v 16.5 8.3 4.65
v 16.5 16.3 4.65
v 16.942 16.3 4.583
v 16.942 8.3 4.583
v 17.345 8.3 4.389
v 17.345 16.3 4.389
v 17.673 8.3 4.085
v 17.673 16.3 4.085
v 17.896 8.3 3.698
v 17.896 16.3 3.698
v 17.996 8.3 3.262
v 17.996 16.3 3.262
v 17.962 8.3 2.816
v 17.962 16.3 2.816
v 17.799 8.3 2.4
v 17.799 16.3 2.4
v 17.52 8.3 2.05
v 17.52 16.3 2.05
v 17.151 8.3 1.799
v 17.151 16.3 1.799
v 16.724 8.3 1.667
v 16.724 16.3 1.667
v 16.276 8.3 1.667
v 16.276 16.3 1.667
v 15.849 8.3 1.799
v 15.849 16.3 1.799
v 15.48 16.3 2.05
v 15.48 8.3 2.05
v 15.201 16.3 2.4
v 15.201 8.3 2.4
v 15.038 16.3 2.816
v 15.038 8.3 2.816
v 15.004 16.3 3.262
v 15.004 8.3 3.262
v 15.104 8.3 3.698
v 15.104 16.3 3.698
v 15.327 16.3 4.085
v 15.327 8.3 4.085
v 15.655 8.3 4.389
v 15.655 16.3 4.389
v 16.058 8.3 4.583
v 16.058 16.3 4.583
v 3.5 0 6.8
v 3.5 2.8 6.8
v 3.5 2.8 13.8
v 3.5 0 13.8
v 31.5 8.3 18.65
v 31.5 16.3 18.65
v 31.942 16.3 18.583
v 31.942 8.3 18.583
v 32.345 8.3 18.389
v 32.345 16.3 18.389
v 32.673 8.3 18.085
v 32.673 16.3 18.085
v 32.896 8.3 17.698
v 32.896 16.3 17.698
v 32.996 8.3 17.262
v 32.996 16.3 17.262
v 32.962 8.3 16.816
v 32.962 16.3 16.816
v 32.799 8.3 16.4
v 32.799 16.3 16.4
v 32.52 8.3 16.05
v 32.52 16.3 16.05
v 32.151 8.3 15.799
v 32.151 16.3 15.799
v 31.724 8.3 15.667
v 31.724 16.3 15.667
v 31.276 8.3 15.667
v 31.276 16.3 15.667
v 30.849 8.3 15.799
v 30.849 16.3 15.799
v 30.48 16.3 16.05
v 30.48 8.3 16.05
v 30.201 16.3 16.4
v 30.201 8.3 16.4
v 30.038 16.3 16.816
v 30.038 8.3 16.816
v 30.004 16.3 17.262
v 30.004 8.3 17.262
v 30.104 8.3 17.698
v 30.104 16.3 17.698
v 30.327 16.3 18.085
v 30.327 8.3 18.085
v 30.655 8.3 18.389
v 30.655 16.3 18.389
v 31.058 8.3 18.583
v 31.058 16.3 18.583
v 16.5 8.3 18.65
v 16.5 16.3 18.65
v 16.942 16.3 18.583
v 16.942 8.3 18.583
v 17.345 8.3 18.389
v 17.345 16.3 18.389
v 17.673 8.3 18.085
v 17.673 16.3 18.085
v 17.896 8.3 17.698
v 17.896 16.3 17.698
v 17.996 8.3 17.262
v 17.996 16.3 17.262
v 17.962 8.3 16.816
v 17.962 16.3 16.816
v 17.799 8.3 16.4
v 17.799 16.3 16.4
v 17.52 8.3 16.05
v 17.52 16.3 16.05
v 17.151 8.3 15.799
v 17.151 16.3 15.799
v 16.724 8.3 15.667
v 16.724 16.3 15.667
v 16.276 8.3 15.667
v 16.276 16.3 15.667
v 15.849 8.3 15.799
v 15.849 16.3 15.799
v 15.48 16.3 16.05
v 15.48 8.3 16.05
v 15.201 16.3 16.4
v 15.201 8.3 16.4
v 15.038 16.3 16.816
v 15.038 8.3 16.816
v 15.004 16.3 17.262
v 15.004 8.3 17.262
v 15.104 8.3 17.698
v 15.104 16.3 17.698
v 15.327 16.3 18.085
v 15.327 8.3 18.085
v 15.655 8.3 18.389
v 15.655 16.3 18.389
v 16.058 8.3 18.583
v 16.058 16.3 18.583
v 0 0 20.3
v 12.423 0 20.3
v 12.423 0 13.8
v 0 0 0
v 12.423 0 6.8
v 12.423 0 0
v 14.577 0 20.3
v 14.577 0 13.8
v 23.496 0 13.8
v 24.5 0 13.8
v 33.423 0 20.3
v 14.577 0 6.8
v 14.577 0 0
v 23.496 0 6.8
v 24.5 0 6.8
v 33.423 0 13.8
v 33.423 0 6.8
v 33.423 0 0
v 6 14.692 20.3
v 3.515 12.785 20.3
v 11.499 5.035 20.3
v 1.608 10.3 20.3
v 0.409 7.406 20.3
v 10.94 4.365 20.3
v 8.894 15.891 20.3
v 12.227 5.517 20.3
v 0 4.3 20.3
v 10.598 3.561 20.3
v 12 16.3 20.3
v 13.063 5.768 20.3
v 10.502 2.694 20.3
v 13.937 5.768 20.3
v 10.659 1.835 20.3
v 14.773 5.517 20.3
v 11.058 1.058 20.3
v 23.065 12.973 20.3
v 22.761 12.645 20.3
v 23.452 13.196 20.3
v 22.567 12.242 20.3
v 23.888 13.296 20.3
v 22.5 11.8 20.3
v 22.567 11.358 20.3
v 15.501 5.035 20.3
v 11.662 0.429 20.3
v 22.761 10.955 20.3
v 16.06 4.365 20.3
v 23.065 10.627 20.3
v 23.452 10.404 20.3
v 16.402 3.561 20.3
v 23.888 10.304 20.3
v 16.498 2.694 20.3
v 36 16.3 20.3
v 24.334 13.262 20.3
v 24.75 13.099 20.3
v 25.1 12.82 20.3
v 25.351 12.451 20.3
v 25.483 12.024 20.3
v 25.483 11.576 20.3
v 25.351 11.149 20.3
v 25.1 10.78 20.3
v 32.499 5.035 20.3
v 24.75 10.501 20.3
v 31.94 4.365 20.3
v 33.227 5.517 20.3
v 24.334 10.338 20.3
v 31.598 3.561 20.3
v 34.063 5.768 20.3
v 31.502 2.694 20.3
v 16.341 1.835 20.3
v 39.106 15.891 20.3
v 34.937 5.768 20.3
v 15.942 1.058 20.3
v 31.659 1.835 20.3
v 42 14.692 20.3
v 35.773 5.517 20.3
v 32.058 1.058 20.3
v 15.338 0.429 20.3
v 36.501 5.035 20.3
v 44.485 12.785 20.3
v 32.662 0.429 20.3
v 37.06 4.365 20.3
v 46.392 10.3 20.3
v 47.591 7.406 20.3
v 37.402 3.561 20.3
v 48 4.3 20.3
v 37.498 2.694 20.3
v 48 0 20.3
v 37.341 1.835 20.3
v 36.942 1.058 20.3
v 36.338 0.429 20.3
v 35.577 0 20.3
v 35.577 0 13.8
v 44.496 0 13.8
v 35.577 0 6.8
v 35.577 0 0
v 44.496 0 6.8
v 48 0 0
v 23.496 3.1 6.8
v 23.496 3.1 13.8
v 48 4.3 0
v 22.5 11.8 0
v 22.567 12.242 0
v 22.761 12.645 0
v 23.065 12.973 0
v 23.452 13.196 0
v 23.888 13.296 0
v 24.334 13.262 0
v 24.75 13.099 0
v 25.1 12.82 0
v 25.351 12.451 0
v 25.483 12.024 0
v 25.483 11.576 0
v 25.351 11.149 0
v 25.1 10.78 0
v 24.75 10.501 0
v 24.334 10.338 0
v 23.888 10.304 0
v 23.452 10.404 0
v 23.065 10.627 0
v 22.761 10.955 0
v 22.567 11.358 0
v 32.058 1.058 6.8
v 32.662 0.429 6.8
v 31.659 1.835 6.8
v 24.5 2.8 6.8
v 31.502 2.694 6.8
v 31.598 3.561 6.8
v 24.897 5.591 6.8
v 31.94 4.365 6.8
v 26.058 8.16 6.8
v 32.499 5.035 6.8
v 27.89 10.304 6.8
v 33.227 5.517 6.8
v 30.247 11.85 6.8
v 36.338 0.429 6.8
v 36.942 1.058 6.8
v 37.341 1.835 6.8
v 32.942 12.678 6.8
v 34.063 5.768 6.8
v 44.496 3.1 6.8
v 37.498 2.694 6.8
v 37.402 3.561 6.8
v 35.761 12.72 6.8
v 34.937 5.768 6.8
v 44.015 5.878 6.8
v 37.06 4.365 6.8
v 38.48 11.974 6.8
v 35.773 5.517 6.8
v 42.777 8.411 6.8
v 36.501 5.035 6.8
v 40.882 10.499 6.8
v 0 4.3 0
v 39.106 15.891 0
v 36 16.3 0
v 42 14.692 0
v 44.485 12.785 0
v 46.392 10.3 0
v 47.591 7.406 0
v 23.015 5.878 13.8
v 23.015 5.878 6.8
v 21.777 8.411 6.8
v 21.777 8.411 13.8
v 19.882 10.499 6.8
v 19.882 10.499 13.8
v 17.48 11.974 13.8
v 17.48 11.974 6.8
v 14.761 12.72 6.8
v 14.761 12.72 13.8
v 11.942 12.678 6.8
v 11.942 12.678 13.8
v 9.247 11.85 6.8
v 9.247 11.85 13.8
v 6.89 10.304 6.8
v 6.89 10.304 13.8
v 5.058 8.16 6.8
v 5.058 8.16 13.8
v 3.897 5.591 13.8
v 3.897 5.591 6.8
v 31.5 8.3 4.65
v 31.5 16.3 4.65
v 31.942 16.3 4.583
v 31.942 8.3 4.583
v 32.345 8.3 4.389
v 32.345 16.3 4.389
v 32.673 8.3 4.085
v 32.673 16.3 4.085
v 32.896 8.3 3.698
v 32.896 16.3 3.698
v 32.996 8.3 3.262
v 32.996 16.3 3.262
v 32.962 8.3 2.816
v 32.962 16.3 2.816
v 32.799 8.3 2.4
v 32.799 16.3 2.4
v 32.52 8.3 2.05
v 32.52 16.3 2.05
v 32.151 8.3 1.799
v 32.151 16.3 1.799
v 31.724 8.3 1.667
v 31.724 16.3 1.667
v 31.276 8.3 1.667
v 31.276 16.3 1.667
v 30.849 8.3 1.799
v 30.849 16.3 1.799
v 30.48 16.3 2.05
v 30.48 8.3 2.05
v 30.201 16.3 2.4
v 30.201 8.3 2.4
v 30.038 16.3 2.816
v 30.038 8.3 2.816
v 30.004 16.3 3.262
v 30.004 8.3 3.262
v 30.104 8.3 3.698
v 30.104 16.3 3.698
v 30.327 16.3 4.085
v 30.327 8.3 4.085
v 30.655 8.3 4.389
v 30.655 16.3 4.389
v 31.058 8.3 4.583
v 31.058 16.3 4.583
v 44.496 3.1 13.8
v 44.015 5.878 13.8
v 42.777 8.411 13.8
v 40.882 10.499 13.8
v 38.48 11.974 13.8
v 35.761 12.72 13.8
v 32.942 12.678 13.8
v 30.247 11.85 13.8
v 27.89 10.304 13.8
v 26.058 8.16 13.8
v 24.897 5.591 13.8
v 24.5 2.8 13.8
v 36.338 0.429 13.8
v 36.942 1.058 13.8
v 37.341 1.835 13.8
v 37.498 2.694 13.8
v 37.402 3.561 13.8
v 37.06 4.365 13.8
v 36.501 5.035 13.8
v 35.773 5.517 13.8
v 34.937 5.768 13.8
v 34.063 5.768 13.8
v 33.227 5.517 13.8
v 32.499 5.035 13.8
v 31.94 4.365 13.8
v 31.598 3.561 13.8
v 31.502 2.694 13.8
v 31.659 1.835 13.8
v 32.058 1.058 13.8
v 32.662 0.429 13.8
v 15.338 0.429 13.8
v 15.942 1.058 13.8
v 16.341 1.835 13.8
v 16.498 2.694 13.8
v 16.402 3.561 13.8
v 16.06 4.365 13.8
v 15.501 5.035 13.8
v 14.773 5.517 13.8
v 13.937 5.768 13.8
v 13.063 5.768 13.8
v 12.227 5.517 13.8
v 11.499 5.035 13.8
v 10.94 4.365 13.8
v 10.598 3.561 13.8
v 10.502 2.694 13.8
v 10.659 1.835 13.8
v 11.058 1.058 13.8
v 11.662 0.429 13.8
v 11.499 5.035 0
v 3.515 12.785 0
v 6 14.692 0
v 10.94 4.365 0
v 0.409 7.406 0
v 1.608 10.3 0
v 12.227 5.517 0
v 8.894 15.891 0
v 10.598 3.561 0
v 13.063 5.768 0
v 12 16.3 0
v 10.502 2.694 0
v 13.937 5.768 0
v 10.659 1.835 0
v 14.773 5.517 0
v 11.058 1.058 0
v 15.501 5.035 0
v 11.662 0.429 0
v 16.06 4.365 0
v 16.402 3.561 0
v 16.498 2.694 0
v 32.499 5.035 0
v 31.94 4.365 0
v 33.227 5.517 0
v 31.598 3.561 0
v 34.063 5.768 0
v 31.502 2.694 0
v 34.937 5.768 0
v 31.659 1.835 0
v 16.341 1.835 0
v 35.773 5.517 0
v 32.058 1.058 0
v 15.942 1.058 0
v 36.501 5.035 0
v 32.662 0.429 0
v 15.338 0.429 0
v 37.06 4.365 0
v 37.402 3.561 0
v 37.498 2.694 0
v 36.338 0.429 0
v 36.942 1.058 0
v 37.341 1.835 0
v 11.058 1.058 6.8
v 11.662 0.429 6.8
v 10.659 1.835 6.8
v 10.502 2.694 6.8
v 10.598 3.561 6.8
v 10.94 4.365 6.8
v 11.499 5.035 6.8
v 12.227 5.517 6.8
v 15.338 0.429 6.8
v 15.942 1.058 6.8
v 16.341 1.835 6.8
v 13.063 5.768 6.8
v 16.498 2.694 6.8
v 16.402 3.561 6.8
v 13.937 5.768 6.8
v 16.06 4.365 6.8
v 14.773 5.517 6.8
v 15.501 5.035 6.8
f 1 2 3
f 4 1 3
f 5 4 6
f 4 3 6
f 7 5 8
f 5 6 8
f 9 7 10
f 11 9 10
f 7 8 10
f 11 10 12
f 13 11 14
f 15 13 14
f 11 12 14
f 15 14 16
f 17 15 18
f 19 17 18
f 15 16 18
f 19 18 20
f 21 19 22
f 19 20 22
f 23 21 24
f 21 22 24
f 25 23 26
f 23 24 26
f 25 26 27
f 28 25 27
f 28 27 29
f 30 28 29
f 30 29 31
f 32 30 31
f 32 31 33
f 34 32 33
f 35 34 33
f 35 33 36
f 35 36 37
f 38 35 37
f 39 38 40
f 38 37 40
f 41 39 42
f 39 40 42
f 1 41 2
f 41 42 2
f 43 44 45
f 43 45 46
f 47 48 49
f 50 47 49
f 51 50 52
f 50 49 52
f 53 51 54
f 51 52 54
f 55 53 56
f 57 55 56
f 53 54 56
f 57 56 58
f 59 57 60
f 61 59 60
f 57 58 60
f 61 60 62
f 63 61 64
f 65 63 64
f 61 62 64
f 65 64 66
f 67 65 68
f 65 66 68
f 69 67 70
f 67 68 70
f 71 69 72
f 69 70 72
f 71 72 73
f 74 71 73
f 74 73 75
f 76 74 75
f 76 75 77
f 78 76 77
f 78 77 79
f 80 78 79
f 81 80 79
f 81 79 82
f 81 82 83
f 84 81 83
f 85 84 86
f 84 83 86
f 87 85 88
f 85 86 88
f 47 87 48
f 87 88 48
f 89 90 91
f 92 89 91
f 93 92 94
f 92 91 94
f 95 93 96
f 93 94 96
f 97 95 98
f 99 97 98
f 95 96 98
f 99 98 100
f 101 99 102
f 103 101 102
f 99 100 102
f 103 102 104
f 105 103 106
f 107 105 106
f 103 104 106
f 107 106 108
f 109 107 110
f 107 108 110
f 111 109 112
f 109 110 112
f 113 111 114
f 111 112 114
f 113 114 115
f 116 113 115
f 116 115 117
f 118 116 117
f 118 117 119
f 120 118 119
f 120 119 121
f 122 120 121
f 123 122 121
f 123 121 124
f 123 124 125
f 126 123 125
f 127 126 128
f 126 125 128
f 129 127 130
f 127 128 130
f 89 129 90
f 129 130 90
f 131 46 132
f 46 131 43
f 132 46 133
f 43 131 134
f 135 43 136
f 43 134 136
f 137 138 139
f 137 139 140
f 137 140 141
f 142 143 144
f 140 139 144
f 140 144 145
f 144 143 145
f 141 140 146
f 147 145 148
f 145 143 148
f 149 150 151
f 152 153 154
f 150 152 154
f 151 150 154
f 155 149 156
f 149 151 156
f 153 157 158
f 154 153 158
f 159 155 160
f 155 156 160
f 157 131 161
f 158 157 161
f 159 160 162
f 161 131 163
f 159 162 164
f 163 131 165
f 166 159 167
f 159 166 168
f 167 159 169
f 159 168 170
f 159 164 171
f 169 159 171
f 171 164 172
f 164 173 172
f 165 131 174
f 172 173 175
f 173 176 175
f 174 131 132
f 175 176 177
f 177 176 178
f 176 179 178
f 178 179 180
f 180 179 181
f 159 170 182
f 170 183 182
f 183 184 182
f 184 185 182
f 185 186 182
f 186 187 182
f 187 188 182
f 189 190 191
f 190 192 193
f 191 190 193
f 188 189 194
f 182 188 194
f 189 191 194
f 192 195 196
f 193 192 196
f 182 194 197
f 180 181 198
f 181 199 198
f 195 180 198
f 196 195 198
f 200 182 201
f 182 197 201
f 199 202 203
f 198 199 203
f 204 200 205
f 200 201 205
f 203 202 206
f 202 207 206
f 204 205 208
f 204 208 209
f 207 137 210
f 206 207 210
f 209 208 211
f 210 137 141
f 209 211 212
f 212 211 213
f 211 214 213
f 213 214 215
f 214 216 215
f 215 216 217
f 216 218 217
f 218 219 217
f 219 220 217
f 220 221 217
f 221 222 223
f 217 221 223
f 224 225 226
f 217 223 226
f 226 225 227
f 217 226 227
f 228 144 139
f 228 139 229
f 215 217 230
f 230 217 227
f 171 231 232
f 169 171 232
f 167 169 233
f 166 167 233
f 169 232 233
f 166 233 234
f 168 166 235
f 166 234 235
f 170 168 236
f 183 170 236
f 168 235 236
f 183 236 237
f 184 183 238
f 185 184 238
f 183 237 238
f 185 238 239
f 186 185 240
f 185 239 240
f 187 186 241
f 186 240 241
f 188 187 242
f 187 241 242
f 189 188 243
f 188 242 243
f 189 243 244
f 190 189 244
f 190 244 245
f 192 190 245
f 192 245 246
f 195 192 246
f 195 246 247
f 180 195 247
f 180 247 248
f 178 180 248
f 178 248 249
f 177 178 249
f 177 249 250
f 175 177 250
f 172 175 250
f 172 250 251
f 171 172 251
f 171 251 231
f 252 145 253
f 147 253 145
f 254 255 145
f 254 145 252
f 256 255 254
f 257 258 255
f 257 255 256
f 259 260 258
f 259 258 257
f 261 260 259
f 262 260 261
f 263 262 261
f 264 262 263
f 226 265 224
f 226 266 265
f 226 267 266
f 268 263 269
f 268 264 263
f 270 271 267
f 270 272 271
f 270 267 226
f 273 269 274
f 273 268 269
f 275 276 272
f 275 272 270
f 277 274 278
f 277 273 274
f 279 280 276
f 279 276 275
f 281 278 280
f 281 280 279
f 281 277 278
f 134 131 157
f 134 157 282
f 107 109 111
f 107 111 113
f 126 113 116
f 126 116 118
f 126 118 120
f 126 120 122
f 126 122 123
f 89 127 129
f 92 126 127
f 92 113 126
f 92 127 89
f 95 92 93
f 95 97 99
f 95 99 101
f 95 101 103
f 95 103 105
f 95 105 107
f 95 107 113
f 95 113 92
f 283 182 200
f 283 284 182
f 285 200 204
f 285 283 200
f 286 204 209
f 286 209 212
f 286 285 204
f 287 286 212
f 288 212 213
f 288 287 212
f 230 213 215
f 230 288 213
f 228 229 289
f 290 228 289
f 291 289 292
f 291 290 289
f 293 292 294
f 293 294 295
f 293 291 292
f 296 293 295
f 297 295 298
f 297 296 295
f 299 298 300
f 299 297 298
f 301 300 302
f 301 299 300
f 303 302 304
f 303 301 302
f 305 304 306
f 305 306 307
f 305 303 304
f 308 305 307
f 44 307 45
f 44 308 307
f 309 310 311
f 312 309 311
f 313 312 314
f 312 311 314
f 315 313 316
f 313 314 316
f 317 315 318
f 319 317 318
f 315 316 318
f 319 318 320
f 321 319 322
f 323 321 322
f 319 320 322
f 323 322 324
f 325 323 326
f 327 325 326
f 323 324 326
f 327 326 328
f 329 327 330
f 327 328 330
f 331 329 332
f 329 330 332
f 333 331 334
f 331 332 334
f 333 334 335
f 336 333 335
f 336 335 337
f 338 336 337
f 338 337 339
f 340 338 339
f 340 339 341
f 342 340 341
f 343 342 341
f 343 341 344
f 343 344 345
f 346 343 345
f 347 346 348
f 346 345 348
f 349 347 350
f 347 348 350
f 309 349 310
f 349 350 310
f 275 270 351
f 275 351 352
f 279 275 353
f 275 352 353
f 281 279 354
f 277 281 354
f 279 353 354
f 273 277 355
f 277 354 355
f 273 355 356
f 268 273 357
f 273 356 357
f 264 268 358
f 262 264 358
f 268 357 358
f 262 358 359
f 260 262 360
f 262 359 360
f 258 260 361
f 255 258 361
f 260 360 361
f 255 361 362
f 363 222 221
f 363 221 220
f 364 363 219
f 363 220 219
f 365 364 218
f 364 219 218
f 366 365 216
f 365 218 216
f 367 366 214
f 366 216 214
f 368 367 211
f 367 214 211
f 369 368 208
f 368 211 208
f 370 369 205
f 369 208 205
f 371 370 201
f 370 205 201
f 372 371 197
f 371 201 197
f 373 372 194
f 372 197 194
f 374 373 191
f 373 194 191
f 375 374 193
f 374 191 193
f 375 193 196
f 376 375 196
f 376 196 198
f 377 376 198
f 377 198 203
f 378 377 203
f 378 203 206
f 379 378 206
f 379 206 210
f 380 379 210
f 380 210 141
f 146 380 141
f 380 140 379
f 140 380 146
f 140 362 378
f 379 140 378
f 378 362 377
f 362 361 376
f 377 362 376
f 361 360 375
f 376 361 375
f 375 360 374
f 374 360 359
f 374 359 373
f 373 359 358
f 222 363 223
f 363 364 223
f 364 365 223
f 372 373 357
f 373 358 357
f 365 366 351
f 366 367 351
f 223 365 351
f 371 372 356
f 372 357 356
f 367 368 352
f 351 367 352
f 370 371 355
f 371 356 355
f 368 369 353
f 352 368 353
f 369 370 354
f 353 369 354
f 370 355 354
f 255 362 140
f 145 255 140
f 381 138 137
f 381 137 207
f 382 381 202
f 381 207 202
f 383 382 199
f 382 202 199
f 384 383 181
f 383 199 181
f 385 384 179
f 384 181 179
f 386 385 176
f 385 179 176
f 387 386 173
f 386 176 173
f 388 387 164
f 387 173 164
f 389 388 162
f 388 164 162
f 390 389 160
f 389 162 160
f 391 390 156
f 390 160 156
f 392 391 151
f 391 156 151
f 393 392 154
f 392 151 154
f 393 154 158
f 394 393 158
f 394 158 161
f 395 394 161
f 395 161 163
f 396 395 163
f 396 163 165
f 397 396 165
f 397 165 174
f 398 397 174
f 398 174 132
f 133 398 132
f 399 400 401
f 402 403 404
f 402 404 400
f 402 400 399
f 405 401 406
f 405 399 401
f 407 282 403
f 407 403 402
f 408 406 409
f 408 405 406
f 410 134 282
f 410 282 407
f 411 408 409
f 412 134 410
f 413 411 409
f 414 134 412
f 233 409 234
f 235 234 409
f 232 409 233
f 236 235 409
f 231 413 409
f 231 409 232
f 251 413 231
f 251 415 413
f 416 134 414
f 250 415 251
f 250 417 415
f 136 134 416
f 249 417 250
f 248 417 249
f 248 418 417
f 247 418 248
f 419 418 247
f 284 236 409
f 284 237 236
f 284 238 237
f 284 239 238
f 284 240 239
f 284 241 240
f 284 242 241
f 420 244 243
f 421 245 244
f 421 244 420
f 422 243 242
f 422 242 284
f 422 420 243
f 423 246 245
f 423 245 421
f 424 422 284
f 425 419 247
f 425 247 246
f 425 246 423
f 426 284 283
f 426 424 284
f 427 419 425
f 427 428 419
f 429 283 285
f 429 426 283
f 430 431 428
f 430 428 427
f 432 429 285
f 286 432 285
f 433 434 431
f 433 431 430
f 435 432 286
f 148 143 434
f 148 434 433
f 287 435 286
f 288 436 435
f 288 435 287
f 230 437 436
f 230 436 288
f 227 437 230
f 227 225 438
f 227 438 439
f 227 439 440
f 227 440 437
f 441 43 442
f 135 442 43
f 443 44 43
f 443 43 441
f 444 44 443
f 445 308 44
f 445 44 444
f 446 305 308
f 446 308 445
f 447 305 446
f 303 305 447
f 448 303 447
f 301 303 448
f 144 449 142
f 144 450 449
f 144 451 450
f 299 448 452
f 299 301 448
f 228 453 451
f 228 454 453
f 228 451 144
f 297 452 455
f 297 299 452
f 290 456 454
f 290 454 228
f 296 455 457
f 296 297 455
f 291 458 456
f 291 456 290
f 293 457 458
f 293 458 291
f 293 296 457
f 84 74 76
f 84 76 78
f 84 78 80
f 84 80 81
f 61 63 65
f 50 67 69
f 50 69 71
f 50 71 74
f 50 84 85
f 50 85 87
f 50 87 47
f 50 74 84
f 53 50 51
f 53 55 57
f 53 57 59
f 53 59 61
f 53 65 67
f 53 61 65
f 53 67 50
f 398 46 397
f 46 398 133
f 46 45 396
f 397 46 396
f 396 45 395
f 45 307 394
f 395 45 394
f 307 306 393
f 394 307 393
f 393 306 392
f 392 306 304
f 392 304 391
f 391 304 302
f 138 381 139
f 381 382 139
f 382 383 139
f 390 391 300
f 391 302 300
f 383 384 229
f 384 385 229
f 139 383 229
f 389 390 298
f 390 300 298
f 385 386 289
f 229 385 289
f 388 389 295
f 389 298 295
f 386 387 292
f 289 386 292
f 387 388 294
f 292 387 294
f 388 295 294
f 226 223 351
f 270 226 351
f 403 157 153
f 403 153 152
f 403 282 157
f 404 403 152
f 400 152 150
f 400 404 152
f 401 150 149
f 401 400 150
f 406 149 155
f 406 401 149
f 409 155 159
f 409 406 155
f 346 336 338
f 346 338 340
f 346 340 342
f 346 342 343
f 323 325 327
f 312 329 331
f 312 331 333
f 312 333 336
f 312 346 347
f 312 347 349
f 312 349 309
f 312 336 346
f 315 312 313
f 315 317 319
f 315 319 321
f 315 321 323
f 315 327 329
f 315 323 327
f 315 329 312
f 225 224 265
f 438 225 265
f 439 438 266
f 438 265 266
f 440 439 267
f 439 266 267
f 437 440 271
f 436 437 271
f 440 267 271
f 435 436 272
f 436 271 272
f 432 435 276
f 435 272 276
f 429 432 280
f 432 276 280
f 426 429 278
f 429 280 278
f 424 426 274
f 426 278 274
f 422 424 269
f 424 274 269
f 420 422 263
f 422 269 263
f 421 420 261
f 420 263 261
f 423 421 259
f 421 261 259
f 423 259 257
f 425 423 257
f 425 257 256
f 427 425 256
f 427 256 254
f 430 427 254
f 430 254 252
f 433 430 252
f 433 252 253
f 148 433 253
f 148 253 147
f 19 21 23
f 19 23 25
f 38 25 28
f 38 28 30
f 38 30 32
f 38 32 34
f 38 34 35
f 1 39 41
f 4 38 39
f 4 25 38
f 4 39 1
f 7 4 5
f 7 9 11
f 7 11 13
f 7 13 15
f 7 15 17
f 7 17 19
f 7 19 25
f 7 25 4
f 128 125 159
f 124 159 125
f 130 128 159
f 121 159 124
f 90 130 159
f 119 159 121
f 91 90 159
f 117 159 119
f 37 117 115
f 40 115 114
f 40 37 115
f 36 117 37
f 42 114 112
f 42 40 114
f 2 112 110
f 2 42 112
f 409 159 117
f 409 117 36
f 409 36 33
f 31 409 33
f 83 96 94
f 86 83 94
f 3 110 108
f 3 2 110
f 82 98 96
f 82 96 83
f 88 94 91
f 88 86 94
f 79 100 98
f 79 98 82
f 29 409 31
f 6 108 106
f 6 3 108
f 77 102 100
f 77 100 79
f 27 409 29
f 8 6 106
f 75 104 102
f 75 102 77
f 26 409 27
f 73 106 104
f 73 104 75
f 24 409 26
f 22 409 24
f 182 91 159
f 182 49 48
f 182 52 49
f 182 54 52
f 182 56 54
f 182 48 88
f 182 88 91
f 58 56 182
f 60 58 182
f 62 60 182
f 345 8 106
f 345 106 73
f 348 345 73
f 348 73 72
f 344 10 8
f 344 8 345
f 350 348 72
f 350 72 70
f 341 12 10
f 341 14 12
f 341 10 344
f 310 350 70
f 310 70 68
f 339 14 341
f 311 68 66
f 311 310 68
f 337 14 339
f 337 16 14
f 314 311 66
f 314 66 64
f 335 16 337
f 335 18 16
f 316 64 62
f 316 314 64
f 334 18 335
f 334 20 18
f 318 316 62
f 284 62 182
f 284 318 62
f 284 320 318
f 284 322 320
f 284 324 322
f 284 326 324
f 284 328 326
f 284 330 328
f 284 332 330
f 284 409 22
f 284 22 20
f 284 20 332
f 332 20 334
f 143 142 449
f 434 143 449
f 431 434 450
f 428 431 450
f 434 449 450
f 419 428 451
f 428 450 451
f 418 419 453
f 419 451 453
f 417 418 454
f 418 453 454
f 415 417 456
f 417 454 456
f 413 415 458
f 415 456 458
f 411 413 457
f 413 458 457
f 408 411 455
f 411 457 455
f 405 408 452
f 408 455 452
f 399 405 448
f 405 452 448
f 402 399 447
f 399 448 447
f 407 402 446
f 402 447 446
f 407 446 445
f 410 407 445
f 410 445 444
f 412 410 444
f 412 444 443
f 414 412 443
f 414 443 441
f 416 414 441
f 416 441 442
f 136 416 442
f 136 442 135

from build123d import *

# Parameters (mm, degrees)
SKETCH1_W           = 48
SKETCH1_H           = 20.3
BOSS_EXTRUDE1_DEPTH = 16.3
SKETCH2_R           = 3
CUT_EXTRUDE1_DEPTH  = 55.605677361
CUT_EXTRUDE2_DEPTH  = 3.5
FILLET1_R           = 12
SKETCH4_R           = 1.5
CUT_EXTRUDE3_DEPTH  = 55.605677361
SKETCH5_R           = 1.5
CUT_EXTRUDE4_DEPTH  = 8


with BuildPart() as part:
    # Sketch1 → Boss-Extrude1 (new body)
    with BuildSketch(Plane(origin=(0, 0, 0), x_dir=(1, 0, 0), z_dir=(0, 1, 0))):
        with Locations((24, -10.15)):
            Rectangle(SKETCH1_W, SKETCH1_H)
    extrude(amount=BOSS_EXTRUDE1_DEPTH)

    # Sketch2 → Cut-Extrude1 (cut, through all)
    with BuildSketch(Plane.XY.offset(20.3)):
        with Locations((13.5, 2.8)):
            Circle(SKETCH2_R)
        with Locations((34.5, 2.8)):
            Circle(SKETCH2_R)
    extrude(amount=-CUT_EXTRUDE1_DEPTH, mode=Mode.SUBTRACT)

    # Sketch3 → Cut-Extrude2 (cut, symmetric)
    with BuildSketch(Plane.XY.offset(10.3)):
        with BuildLine():
            Line((3.5, 2.8), (3.5, -6.25))
            Line((3.5, -6.25), (23.495503035, -6.25))
            Line((23.495503035, -6.25), (23.495503035, 3.099865091))
            ThreePointArc((23.495503035, 3.099865091), (13.350050596, 12.798875696), (3.5, 2.8))
        make_face()
        with BuildLine():
            Line((24.5, 2.8), (24.5, -6.25))
            Line((24.5, -6.25), (44.495503035, -6.25))
            Line((44.495503035, -6.25), (44.495503035, 3.099865091))
            ThreePointArc((44.495503035, 3.099865091), (34.350050596, 12.798875696), (24.5, 2.8))
        make_face()
    extrude(amount=CUT_EXTRUDE2_DEPTH, both=True, mode=Mode.SUBTRACT)

    # Fillet1
    fillet1_edges = [part.edges().sort_by_distance(p)[0] for p in [
        (48, 16.3, 10.15),
        (0, 16.3, 10.15),
    ]]
    fillet(fillet1_edges, radius=FILLET1_R)

    # Sketch4 → Cut-Extrude3 (cut, through all)
    with BuildSketch(Plane(origin=(0, 0, 0), x_dir=(-1, 0, 0), z_dir=(0, 0, -1))):
        with Locations((-24, 11.8)):
            Circle(SKETCH4_R)
    extrude(amount=-CUT_EXTRUDE3_DEPTH, mode=Mode.SUBTRACT)

    # Sketch5 → Cut-Extrude4 (cut)
    with BuildSketch(Plane(origin=(0, 16.3, 0), x_dir=(1, 0, 0), z_dir=(0, 1, 0))):
        with Locations(Location((31.5, -17.15, 0), (0, 0, 270))):
            Circle(SKETCH5_R)
        with Locations(Location((16.5, -17.15, 0), (0, 0, 270))):
            Circle(SKETCH5_R)
        with Locations(Location((16.5, -3.15, 0), (0, 0, 270))):
            Circle(SKETCH5_R)
        with Locations(Location((31.5, -3.15, 0), (0, 0, 270))):
            Circle(SKETCH5_R)
    extrude(amount=-CUT_EXTRUDE4_DEPTH, mode=Mode.SUBTRACT)


solid = part.part
